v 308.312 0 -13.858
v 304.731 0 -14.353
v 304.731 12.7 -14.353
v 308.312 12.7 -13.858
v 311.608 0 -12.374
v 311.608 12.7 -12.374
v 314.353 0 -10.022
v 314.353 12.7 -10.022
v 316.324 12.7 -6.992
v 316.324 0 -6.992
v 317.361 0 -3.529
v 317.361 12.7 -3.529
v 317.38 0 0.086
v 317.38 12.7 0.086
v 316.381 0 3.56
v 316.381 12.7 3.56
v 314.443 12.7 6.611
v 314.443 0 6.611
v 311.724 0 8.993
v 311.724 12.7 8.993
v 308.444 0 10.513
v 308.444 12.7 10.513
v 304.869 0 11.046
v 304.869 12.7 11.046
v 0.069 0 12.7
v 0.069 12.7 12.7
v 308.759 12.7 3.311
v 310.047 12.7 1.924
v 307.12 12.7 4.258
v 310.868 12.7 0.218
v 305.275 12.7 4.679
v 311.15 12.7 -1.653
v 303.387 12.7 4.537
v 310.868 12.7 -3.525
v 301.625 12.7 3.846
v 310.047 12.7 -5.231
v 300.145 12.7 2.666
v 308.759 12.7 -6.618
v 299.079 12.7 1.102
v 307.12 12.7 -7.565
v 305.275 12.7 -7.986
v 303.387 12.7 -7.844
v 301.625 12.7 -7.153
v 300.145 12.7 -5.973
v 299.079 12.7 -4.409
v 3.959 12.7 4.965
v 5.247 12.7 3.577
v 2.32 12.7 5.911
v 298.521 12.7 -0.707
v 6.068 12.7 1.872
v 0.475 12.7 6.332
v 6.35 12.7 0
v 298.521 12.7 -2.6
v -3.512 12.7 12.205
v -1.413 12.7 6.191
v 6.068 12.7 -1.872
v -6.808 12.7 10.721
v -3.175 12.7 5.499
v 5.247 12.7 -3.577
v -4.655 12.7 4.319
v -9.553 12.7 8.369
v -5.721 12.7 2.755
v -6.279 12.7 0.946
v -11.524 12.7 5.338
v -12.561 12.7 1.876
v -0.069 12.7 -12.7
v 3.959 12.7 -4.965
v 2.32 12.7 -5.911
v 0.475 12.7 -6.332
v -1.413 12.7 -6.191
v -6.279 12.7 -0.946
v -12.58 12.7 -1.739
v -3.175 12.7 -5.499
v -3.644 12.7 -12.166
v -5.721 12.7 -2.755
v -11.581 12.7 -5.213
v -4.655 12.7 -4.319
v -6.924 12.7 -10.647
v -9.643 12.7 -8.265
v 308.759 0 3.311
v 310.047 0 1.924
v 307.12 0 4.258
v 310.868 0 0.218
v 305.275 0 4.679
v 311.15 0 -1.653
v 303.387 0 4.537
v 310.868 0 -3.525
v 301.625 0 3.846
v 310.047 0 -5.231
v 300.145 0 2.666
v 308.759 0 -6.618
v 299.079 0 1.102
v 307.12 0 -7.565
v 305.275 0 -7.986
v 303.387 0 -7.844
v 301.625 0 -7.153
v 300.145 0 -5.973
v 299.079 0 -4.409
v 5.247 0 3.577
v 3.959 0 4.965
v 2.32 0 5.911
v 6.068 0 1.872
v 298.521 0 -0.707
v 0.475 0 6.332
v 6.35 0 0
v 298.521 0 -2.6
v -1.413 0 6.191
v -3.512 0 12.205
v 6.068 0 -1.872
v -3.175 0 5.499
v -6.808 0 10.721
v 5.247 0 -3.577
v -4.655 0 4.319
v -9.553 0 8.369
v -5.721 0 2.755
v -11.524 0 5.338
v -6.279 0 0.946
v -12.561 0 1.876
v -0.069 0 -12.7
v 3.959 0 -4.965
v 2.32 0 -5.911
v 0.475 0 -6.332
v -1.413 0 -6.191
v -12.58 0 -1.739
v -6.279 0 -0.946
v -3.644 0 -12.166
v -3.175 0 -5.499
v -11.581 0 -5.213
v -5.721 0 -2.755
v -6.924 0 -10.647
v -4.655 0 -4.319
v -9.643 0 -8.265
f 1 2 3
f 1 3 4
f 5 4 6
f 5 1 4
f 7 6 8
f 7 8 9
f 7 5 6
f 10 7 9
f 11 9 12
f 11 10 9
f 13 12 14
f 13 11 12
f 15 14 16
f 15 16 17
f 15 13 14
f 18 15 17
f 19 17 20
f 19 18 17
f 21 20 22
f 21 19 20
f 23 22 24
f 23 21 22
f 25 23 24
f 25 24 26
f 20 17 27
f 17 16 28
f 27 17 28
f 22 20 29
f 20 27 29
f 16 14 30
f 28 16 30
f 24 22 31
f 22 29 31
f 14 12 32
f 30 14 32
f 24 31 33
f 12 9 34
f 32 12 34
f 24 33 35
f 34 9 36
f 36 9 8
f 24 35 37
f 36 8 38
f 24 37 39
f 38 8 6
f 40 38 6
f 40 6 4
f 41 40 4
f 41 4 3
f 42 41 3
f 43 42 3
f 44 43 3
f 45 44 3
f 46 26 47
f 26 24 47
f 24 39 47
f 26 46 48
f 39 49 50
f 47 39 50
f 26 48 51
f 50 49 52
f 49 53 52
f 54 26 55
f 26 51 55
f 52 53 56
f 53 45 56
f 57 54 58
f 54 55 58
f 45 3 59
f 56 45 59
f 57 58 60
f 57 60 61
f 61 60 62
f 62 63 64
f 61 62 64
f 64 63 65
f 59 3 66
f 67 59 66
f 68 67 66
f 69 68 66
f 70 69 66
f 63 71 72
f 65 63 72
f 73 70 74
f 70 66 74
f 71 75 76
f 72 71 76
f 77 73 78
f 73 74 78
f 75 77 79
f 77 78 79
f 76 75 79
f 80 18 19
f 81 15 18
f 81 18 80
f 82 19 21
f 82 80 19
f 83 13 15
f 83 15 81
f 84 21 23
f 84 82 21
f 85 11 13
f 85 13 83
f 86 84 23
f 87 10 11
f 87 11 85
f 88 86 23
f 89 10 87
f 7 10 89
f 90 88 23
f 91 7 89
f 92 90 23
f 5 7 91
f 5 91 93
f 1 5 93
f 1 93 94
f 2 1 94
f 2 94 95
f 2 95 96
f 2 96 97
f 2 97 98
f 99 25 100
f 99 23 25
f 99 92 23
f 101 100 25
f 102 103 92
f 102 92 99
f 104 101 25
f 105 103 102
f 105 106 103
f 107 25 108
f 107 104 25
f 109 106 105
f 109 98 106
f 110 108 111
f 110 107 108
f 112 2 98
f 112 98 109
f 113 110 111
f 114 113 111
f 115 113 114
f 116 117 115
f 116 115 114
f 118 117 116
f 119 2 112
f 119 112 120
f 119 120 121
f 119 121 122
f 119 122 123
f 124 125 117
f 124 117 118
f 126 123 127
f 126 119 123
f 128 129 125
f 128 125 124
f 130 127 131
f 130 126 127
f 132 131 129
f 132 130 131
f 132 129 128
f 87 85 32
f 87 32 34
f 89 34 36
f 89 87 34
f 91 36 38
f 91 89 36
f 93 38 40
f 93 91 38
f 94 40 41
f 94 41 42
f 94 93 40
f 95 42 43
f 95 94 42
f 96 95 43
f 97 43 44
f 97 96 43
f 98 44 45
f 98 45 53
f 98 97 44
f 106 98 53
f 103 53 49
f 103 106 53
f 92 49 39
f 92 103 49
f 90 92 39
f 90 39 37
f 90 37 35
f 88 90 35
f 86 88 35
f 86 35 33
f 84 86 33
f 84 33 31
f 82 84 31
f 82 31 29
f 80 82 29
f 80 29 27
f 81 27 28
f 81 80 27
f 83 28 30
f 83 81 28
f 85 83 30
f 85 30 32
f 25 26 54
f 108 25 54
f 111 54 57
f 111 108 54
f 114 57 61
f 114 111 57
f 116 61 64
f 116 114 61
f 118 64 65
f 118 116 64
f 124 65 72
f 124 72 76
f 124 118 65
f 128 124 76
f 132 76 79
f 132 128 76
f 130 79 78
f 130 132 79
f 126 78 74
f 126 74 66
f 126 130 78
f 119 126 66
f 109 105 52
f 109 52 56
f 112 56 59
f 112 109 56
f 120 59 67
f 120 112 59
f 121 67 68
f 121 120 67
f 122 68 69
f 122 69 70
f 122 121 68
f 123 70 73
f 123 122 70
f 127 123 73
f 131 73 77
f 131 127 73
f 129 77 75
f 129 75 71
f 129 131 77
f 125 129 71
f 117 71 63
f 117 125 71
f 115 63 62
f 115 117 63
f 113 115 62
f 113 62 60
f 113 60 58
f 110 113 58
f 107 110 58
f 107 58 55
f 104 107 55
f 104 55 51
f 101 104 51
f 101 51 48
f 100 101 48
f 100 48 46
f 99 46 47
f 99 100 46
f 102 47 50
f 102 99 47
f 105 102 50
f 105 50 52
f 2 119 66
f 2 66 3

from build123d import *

# Parameters (mm, degrees)
SKETCH1_R           = 6.35
BOSS_EXTRUDE1_DEPTH = 12.7


with BuildPart() as part:
    # Sketch1 → Boss-Extrude1 (new body)
    with BuildSketch(Plane(origin=(0, 0, 0), x_dir=(1, 0, 0), z_dir=(0, 1, 0))):
        with BuildLine():
            Line((-0.068893261, 12.699813137), (304.731106739, 14.353275727))
            ThreePointArc((304.731106739, 14.353275727), (317.499813137, 1.722355851), (304.868893261, -11.046350547))
            Line((304.868893261, -11.046350547), (0.068893261, -12.699813137))
            ThreePointArc((0.068893261, -12.699813137), (-12.699813137, -0.068893261), (-0.068893261, 12.699813137))
        make_face()
        Circle(SKETCH1_R, mode=Mode.SUBTRACT)
        with Locations((304.8, 1.65346259)):
            Circle(SKETCH1_R, mode=Mode.SUBTRACT)
    extrude(amount=BOSS_EXTRUDE1_DEPTH)


solid = part.part
